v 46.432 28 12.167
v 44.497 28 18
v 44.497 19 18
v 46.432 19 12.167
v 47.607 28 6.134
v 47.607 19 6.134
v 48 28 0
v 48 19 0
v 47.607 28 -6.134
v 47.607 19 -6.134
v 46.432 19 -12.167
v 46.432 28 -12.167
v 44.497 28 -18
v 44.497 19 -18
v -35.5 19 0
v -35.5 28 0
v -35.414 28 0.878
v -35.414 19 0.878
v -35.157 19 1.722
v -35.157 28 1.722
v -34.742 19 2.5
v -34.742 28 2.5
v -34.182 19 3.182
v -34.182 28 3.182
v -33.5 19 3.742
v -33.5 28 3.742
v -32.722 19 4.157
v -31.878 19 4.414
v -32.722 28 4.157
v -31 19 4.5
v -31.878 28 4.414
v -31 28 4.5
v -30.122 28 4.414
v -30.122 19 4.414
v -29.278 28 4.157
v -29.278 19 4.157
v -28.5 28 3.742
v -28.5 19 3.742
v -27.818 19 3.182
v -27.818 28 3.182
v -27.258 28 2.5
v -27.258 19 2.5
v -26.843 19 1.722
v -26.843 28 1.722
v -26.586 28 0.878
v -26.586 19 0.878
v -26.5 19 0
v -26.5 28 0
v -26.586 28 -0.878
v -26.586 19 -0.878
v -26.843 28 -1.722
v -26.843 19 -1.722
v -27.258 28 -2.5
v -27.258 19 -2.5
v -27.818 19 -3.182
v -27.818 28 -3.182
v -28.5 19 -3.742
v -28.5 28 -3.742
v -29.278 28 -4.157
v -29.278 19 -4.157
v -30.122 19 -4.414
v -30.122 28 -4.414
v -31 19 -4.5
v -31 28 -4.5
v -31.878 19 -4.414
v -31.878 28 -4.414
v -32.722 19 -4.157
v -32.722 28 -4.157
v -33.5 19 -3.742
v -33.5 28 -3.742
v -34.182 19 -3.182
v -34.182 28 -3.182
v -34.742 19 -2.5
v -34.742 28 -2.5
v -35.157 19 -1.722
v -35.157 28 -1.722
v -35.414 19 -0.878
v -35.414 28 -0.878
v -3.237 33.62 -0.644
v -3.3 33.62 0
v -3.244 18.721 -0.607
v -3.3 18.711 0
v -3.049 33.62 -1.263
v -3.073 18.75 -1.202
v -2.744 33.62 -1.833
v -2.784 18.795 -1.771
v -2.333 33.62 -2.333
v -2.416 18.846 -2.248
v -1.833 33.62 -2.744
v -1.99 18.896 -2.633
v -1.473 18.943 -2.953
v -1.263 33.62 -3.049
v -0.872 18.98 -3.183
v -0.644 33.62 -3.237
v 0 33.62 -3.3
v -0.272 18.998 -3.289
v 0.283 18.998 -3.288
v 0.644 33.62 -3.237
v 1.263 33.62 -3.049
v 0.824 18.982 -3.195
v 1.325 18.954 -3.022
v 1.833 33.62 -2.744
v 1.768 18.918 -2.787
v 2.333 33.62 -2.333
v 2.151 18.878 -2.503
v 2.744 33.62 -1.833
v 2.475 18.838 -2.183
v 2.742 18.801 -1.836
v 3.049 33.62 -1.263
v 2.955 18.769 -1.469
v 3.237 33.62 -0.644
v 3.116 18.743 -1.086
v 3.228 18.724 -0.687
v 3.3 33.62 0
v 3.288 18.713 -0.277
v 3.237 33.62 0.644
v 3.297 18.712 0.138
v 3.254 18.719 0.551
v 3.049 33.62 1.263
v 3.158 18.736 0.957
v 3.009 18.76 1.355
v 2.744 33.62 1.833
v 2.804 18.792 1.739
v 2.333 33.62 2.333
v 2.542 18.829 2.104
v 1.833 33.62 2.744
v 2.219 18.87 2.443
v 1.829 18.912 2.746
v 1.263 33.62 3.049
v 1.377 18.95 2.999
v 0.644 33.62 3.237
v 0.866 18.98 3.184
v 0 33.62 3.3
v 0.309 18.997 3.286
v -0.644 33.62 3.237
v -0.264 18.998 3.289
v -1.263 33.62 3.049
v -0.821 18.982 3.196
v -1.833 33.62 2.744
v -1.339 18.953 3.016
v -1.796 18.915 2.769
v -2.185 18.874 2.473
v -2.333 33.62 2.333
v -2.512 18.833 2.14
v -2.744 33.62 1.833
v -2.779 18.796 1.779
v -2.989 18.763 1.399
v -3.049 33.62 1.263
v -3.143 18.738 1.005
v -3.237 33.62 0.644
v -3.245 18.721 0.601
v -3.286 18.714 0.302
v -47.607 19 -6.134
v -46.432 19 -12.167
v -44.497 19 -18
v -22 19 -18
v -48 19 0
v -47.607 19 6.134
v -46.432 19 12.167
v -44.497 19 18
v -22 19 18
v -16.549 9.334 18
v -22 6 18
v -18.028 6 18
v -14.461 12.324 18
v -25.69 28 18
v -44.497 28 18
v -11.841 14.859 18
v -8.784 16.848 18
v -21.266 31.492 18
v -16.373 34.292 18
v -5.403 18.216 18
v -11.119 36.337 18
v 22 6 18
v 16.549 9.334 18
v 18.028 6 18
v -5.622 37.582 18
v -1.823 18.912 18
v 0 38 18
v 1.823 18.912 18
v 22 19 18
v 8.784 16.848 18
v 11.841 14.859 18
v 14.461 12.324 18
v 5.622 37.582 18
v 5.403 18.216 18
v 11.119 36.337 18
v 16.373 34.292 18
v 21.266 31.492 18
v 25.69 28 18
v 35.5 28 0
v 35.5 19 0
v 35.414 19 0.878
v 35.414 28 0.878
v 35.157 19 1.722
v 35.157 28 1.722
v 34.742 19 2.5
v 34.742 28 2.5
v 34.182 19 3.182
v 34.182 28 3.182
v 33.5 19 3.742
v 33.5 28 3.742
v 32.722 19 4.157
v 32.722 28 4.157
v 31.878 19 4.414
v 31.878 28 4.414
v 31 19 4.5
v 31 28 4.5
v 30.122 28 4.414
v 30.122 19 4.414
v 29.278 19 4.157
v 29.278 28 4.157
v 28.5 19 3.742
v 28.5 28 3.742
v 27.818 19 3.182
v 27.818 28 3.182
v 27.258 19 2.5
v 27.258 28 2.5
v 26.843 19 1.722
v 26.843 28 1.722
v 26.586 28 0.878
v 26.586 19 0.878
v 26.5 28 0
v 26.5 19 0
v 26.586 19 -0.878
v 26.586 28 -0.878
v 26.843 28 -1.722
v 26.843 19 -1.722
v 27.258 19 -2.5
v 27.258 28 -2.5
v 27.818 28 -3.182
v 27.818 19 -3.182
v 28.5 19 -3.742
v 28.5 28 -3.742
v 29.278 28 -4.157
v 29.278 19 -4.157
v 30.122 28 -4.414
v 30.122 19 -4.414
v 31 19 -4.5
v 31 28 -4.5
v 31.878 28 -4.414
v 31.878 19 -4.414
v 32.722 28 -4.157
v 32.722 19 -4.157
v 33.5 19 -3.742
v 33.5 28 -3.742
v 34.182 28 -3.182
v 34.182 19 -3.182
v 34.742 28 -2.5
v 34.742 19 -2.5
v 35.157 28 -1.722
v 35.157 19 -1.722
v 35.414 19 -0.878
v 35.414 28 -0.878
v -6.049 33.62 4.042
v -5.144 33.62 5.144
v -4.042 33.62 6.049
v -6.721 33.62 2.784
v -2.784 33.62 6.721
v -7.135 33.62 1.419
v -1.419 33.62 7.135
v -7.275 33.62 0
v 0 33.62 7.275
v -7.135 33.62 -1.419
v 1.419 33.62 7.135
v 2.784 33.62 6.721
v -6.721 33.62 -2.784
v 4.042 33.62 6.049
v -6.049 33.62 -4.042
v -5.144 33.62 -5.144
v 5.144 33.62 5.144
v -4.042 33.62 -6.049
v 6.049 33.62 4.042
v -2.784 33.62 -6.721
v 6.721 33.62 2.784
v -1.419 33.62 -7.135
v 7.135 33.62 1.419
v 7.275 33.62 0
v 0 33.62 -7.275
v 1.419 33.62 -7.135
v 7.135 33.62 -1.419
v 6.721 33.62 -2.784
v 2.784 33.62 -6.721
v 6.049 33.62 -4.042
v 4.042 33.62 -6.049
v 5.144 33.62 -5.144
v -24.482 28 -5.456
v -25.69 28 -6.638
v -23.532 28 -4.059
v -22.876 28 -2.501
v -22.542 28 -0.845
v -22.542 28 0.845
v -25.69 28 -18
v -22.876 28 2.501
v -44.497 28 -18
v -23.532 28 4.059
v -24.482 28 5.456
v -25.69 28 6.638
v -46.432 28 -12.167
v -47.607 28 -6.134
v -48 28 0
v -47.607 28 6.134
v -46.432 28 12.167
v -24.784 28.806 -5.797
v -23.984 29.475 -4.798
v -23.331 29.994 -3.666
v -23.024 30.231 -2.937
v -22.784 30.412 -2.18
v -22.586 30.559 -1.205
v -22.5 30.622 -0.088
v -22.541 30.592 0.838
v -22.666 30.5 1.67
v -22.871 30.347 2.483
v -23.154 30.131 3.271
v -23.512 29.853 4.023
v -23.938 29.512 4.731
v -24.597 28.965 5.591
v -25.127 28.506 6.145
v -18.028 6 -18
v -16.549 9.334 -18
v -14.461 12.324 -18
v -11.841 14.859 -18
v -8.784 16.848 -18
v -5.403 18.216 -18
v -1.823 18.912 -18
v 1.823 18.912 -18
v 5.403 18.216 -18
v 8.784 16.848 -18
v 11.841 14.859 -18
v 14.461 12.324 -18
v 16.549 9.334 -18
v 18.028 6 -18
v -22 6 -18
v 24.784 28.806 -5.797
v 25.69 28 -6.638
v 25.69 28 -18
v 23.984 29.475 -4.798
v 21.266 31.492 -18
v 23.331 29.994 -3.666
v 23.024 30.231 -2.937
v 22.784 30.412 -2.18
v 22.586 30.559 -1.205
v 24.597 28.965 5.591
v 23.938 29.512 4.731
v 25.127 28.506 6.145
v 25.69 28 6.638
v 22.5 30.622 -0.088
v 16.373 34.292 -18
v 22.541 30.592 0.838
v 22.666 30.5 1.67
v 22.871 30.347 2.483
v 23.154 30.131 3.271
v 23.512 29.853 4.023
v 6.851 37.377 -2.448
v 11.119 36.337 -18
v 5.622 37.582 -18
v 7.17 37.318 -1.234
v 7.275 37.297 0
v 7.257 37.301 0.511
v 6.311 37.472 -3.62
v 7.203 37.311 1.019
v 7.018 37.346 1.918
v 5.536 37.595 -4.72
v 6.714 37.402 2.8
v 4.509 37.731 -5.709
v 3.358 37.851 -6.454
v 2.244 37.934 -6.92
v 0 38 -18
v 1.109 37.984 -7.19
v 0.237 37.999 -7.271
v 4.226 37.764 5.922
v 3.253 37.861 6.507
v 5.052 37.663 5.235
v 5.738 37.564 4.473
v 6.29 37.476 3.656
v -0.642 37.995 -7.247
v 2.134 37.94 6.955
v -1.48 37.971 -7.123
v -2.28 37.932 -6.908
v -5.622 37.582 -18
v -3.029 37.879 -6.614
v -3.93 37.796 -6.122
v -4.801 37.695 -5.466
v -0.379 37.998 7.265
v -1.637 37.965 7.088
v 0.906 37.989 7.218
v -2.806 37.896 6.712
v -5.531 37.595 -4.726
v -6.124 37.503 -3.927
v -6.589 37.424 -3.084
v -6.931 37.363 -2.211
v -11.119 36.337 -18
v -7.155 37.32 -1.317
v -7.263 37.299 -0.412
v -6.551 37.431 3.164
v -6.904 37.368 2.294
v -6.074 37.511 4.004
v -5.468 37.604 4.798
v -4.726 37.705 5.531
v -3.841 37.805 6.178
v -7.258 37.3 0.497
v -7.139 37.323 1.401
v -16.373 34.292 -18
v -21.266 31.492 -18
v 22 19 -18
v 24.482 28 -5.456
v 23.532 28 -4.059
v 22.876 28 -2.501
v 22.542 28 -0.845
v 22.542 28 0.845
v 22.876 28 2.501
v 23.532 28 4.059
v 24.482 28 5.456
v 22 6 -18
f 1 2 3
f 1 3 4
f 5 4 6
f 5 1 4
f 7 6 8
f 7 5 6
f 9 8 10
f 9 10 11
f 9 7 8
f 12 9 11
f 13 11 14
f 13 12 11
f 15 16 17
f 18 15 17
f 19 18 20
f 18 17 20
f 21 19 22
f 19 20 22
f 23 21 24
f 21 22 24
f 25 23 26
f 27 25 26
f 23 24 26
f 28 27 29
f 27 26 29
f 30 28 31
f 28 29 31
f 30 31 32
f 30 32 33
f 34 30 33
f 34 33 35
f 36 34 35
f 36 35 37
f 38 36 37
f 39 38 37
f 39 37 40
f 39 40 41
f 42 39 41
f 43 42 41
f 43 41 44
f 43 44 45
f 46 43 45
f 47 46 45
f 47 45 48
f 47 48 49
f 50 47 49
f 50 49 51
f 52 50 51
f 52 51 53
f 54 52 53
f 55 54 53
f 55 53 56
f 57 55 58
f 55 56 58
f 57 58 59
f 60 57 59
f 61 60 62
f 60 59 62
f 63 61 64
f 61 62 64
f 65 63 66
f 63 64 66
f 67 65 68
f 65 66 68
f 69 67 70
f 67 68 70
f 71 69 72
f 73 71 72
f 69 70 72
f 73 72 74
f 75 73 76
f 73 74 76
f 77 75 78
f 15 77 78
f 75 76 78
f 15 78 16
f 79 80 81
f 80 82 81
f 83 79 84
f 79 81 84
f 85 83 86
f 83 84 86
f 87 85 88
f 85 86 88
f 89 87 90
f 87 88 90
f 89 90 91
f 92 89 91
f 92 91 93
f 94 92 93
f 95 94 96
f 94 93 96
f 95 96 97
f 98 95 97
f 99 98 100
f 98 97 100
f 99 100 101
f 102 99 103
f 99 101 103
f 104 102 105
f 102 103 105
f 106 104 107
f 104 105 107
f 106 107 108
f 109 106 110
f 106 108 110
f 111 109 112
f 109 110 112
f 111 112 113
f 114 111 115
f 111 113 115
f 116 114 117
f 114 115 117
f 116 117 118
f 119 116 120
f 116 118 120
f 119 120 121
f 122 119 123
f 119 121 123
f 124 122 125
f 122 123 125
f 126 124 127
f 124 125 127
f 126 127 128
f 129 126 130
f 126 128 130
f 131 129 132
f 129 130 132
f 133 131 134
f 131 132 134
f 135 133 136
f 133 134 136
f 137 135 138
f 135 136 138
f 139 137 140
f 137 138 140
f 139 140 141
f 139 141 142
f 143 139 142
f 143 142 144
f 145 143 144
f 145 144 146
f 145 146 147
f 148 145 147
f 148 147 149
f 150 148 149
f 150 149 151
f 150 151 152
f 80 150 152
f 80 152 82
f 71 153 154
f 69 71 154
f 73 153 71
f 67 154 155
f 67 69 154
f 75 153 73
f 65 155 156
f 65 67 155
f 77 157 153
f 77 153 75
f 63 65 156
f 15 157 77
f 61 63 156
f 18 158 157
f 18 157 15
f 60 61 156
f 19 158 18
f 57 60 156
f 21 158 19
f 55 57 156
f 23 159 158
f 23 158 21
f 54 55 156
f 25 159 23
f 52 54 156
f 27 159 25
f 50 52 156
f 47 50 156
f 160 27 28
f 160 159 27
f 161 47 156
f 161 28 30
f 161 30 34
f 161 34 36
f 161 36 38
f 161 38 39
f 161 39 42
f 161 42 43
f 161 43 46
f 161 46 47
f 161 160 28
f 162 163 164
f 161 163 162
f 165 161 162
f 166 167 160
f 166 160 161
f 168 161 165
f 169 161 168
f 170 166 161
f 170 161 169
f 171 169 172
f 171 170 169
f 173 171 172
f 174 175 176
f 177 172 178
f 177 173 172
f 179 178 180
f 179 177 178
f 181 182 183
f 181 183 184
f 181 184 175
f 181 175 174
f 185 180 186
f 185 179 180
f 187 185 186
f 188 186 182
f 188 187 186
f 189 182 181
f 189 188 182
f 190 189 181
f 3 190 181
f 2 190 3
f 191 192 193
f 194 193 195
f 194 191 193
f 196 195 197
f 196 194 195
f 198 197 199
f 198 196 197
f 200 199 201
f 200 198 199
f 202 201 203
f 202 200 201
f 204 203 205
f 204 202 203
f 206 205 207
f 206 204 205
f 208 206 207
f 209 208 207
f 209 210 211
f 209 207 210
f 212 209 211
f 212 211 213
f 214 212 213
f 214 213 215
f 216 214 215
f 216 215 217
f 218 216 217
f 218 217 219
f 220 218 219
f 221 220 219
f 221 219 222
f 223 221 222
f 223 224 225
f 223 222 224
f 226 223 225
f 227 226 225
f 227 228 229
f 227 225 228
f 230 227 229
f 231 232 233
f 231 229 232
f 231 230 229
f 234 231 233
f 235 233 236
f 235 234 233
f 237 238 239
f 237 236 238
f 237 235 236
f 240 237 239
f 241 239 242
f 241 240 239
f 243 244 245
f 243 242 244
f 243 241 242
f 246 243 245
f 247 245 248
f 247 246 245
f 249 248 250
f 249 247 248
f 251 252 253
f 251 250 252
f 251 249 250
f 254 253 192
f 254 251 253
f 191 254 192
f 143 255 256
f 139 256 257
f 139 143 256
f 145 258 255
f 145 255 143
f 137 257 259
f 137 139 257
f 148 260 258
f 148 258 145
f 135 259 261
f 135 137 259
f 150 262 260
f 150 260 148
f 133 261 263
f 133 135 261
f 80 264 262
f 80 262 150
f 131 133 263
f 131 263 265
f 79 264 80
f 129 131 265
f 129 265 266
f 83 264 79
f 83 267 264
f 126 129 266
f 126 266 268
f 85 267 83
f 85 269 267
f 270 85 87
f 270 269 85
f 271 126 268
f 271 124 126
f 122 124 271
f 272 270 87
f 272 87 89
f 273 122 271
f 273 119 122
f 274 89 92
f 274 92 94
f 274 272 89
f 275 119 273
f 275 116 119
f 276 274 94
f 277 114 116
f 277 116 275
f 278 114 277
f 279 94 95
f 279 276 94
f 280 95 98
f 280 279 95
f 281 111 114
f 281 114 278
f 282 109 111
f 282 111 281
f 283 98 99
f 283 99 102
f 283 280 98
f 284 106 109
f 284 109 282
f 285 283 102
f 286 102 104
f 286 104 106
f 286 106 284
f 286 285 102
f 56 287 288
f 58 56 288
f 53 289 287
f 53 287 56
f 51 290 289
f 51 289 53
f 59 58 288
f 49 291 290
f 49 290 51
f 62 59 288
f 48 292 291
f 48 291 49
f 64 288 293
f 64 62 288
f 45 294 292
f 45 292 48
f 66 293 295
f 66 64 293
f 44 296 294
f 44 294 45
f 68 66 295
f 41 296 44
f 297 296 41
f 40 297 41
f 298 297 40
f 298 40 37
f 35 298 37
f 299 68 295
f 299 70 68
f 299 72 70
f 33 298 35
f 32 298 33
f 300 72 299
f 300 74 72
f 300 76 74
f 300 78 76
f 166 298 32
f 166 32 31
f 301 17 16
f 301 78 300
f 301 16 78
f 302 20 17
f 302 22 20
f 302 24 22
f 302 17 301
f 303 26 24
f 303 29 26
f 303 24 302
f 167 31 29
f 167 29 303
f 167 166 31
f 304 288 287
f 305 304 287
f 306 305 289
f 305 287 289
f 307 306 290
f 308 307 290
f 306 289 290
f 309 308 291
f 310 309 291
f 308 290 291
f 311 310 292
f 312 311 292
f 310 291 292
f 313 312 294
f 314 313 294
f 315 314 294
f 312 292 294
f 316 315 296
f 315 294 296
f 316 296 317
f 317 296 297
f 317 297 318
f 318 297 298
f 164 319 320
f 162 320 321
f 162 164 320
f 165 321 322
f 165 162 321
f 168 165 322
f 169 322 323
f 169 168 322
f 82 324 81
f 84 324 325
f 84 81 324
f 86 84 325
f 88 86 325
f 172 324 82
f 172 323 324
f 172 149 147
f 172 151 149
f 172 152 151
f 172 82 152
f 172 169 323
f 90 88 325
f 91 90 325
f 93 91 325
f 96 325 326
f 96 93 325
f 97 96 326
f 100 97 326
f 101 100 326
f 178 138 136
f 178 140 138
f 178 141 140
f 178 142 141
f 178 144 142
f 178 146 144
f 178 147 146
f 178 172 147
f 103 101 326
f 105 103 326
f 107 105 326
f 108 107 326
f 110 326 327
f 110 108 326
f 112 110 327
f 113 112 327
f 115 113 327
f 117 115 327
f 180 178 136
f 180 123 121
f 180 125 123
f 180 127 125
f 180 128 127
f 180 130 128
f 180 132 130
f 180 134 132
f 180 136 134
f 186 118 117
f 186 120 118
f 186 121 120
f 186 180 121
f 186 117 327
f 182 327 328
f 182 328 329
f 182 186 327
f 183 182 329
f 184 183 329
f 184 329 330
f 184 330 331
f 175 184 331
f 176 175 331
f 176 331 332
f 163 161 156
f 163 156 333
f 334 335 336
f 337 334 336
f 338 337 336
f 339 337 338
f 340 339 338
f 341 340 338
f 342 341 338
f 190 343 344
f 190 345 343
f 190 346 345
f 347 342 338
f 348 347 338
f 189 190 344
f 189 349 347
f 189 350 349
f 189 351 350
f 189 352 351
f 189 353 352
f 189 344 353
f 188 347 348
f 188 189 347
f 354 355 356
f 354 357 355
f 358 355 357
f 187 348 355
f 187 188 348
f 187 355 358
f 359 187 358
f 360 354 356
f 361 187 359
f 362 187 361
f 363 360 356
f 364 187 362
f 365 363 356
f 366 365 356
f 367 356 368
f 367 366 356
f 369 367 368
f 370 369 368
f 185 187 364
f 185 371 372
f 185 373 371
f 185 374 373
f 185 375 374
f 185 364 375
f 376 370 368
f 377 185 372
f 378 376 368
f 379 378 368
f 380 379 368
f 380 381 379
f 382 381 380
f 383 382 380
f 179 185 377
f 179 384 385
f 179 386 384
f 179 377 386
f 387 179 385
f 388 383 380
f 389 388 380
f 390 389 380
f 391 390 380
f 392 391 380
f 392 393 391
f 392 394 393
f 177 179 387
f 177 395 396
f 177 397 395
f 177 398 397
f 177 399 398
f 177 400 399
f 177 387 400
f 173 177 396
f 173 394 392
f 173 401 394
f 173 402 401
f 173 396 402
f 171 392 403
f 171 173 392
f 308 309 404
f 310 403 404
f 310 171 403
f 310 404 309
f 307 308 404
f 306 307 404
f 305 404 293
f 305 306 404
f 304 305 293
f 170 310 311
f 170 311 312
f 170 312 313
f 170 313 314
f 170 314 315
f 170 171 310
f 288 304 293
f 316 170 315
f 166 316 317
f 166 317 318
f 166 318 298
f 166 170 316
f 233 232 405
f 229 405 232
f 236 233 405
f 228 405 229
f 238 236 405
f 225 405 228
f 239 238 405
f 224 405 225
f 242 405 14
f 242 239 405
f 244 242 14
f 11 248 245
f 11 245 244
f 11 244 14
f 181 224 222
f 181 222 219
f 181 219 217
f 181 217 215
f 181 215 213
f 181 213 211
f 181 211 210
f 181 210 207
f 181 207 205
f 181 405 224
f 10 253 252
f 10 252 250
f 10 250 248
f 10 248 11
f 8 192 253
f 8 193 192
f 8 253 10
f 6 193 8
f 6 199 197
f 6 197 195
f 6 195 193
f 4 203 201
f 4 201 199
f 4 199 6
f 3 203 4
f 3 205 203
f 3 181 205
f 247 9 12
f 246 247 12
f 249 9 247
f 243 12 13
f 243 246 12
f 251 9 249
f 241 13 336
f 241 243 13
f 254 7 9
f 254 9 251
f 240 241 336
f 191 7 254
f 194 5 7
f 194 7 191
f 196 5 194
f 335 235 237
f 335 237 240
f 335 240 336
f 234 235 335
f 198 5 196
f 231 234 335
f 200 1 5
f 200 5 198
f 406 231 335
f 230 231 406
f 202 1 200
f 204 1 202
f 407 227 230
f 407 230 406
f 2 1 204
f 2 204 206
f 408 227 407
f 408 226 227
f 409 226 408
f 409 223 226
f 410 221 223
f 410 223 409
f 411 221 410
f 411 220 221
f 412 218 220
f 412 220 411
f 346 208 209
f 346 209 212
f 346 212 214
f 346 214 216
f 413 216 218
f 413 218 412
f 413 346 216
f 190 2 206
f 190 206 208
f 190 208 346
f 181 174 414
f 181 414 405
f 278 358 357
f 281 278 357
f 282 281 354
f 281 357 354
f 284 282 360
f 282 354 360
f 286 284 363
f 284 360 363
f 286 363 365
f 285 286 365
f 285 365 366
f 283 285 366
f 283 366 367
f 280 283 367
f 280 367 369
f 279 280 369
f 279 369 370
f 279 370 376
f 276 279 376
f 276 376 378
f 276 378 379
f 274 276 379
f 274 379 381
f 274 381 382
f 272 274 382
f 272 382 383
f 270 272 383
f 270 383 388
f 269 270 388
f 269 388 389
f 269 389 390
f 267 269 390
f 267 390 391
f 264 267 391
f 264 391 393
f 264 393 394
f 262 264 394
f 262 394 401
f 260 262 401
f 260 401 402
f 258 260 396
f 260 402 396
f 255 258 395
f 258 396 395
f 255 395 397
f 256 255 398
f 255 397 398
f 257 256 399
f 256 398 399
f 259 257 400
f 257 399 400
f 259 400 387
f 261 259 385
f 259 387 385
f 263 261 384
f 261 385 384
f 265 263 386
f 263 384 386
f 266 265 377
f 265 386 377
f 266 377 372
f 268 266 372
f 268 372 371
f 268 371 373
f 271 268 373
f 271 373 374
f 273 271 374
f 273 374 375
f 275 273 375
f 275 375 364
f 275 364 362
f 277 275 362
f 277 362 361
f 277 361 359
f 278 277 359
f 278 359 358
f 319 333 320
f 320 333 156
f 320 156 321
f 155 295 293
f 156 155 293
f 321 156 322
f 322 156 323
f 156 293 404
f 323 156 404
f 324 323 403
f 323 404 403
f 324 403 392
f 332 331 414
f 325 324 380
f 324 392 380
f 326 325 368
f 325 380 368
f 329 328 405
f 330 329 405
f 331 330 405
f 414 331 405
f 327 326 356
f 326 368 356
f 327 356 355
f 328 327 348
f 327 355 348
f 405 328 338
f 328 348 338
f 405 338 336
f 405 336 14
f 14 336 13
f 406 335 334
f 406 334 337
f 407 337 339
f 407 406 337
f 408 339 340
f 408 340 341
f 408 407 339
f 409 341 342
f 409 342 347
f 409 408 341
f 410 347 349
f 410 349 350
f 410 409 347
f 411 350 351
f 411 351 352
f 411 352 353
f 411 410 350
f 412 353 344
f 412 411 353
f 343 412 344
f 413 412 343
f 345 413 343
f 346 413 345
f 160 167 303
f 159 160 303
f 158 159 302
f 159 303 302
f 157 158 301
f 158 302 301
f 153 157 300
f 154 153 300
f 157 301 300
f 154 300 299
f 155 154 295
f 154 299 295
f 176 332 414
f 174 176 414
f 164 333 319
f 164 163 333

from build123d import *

# Parameters (mm, degrees)
BOSS_EXTRUDE1_DEPTH                     = 18
CUT_EXTRUDE1_DEPTH                      = 9
SKETCH5_R                               = 4.5
CUT_EXTRUDE2_DEPTH                      = 10
CUT_EXTRUDE3_DEPTH                      = 10
CBORE_FOR_M6_HEX_HEAD_BOLT4_D           = 6.6
CBORE_FOR_M6_HEX_HEAD_BOLT4_CBORE_D     = 14.55
CBORE_FOR_M6_HEX_HEAD_BOLT4_CBORE_DEPTH = 4.38


with BuildPart() as part:
    # Sketch1 → Boss-Extrude1 (new body, symmetric)
    with BuildSketch(Plane.XY):
        with BuildLine():
            Line((18.027756377, 6), (22, 6))
            Line((22, 6), (22, 19))
            Line((22, 19), (50, 19))
            Line((50, 19), (50, 28))
            Line((50, 28), (29.380930315, 28))
            Line((29.380930315, 28), (25.690465157, 28))
            ThreePointArc((25.690465157, 28), (0, 38), (-25.690465157, 28))
            Line((-25.690465157, 28), (-29.380930315, 28))
            Line((-29.380930315, 28), (-50, 28))
            Line((-50, 28), (-50, 19))
            Line((-50, 19), (-22, 19))
            Line((-22, 19), (-22, 6))
            Line((-22, 6), (-18.027756377, 6))
            ThreePointArc((-18.027756377, 6), (0, 19), (18.027756377, 6))
        make_face()
    extrude(amount=BOSS_EXTRUDE1_DEPTH, both=True)

    # Sketch4 → Cut-Extrude1 (cut)
    with BuildSketch(Plane(origin=(0, 28, 0), x_dir=(1, 0, 0), z_dir=(0, 1, 0))):
        with BuildLine():
            Line((-44.497190923, 18), (-50, 18))
            Line((-50, 18), (-50, -18))
            Line((-50, -18), (-44.497190923, -18))
            ThreePointArc((-44.497190923, -18), (-48, 0), (-44.497190923, 18))
        make_face()
    cut_extrude1 = extrude(amount=-CUT_EXTRUDE1_DEPTH, mode=Mode.SUBTRACT)

    # Mirror1: Cut-Extrude1 across plane
    add(cut_extrude1.mirror(Plane(origin=(0, 0, 0), x_dir=(0, 0, 1), z_dir=(1, 0, 0))), mode=Mode.SUBTRACT)

    # Sketch5 → Cut-Extrude2 (cut)
    with BuildSketch(Plane(origin=(0, 28, 0), x_dir=(1, 0, 0), z_dir=(0, 1, 0))):
        with Locations(Location((-31, 0, 0), (0, 0, 180))):  # turned: the seam where the file's is
            Circle(SKETCH5_R)
    cut_extrude2 = extrude(amount=-CUT_EXTRUDE2_DEPTH, mode=Mode.SUBTRACT)

    # Sketch7 → Cut-Extrude3 (cut)
    with BuildSketch(Plane(origin=(0, 28, 0), x_dir=(1, 0, 0), z_dir=(0, 1, 0))):
        with BuildLine():
            Line((-25.690465157, -6.637683312), (-25.690465157, 6.637683312))
            ThreePointArc((-25.690465157, 6.637683312), (-22.5, 0), (-25.690465157, -6.637683312))
        make_face()
    cut_extrude3 = extrude(amount=CUT_EXTRUDE3_DEPTH, mode=Mode.SUBTRACT)

    # Mirror2: Cut-Extrude2, Cut-Extrude3 across plane
    add(cut_extrude2.mirror(Plane(origin=(0, 0, 0), x_dir=(0, 0, 1), z_dir=(1, 0, 0))), mode=Mode.SUBTRACT)
    add(cut_extrude3.mirror(Plane(origin=(0, 0, 0), x_dir=(0, 0, 1), z_dir=(1, 0, 0))), mode=Mode.SUBTRACT)

    # CBORE for M6 Hex Head Bolt4 (through all)
    with Locations(Plane(origin=(0, 38, 0), x_dir=(1, 0, 0), z_dir=(0, 1, 0))):
        with Locations((0, 0)):
            CounterBoreHole(CBORE_FOR_M6_HEX_HEAD_BOLT4_D / 2, CBORE_FOR_M6_HEX_HEAD_BOLT4_CBORE_D / 2, CBORE_FOR_M6_HEX_HEAD_BOLT4_CBORE_DEPTH)


solid = part.part
